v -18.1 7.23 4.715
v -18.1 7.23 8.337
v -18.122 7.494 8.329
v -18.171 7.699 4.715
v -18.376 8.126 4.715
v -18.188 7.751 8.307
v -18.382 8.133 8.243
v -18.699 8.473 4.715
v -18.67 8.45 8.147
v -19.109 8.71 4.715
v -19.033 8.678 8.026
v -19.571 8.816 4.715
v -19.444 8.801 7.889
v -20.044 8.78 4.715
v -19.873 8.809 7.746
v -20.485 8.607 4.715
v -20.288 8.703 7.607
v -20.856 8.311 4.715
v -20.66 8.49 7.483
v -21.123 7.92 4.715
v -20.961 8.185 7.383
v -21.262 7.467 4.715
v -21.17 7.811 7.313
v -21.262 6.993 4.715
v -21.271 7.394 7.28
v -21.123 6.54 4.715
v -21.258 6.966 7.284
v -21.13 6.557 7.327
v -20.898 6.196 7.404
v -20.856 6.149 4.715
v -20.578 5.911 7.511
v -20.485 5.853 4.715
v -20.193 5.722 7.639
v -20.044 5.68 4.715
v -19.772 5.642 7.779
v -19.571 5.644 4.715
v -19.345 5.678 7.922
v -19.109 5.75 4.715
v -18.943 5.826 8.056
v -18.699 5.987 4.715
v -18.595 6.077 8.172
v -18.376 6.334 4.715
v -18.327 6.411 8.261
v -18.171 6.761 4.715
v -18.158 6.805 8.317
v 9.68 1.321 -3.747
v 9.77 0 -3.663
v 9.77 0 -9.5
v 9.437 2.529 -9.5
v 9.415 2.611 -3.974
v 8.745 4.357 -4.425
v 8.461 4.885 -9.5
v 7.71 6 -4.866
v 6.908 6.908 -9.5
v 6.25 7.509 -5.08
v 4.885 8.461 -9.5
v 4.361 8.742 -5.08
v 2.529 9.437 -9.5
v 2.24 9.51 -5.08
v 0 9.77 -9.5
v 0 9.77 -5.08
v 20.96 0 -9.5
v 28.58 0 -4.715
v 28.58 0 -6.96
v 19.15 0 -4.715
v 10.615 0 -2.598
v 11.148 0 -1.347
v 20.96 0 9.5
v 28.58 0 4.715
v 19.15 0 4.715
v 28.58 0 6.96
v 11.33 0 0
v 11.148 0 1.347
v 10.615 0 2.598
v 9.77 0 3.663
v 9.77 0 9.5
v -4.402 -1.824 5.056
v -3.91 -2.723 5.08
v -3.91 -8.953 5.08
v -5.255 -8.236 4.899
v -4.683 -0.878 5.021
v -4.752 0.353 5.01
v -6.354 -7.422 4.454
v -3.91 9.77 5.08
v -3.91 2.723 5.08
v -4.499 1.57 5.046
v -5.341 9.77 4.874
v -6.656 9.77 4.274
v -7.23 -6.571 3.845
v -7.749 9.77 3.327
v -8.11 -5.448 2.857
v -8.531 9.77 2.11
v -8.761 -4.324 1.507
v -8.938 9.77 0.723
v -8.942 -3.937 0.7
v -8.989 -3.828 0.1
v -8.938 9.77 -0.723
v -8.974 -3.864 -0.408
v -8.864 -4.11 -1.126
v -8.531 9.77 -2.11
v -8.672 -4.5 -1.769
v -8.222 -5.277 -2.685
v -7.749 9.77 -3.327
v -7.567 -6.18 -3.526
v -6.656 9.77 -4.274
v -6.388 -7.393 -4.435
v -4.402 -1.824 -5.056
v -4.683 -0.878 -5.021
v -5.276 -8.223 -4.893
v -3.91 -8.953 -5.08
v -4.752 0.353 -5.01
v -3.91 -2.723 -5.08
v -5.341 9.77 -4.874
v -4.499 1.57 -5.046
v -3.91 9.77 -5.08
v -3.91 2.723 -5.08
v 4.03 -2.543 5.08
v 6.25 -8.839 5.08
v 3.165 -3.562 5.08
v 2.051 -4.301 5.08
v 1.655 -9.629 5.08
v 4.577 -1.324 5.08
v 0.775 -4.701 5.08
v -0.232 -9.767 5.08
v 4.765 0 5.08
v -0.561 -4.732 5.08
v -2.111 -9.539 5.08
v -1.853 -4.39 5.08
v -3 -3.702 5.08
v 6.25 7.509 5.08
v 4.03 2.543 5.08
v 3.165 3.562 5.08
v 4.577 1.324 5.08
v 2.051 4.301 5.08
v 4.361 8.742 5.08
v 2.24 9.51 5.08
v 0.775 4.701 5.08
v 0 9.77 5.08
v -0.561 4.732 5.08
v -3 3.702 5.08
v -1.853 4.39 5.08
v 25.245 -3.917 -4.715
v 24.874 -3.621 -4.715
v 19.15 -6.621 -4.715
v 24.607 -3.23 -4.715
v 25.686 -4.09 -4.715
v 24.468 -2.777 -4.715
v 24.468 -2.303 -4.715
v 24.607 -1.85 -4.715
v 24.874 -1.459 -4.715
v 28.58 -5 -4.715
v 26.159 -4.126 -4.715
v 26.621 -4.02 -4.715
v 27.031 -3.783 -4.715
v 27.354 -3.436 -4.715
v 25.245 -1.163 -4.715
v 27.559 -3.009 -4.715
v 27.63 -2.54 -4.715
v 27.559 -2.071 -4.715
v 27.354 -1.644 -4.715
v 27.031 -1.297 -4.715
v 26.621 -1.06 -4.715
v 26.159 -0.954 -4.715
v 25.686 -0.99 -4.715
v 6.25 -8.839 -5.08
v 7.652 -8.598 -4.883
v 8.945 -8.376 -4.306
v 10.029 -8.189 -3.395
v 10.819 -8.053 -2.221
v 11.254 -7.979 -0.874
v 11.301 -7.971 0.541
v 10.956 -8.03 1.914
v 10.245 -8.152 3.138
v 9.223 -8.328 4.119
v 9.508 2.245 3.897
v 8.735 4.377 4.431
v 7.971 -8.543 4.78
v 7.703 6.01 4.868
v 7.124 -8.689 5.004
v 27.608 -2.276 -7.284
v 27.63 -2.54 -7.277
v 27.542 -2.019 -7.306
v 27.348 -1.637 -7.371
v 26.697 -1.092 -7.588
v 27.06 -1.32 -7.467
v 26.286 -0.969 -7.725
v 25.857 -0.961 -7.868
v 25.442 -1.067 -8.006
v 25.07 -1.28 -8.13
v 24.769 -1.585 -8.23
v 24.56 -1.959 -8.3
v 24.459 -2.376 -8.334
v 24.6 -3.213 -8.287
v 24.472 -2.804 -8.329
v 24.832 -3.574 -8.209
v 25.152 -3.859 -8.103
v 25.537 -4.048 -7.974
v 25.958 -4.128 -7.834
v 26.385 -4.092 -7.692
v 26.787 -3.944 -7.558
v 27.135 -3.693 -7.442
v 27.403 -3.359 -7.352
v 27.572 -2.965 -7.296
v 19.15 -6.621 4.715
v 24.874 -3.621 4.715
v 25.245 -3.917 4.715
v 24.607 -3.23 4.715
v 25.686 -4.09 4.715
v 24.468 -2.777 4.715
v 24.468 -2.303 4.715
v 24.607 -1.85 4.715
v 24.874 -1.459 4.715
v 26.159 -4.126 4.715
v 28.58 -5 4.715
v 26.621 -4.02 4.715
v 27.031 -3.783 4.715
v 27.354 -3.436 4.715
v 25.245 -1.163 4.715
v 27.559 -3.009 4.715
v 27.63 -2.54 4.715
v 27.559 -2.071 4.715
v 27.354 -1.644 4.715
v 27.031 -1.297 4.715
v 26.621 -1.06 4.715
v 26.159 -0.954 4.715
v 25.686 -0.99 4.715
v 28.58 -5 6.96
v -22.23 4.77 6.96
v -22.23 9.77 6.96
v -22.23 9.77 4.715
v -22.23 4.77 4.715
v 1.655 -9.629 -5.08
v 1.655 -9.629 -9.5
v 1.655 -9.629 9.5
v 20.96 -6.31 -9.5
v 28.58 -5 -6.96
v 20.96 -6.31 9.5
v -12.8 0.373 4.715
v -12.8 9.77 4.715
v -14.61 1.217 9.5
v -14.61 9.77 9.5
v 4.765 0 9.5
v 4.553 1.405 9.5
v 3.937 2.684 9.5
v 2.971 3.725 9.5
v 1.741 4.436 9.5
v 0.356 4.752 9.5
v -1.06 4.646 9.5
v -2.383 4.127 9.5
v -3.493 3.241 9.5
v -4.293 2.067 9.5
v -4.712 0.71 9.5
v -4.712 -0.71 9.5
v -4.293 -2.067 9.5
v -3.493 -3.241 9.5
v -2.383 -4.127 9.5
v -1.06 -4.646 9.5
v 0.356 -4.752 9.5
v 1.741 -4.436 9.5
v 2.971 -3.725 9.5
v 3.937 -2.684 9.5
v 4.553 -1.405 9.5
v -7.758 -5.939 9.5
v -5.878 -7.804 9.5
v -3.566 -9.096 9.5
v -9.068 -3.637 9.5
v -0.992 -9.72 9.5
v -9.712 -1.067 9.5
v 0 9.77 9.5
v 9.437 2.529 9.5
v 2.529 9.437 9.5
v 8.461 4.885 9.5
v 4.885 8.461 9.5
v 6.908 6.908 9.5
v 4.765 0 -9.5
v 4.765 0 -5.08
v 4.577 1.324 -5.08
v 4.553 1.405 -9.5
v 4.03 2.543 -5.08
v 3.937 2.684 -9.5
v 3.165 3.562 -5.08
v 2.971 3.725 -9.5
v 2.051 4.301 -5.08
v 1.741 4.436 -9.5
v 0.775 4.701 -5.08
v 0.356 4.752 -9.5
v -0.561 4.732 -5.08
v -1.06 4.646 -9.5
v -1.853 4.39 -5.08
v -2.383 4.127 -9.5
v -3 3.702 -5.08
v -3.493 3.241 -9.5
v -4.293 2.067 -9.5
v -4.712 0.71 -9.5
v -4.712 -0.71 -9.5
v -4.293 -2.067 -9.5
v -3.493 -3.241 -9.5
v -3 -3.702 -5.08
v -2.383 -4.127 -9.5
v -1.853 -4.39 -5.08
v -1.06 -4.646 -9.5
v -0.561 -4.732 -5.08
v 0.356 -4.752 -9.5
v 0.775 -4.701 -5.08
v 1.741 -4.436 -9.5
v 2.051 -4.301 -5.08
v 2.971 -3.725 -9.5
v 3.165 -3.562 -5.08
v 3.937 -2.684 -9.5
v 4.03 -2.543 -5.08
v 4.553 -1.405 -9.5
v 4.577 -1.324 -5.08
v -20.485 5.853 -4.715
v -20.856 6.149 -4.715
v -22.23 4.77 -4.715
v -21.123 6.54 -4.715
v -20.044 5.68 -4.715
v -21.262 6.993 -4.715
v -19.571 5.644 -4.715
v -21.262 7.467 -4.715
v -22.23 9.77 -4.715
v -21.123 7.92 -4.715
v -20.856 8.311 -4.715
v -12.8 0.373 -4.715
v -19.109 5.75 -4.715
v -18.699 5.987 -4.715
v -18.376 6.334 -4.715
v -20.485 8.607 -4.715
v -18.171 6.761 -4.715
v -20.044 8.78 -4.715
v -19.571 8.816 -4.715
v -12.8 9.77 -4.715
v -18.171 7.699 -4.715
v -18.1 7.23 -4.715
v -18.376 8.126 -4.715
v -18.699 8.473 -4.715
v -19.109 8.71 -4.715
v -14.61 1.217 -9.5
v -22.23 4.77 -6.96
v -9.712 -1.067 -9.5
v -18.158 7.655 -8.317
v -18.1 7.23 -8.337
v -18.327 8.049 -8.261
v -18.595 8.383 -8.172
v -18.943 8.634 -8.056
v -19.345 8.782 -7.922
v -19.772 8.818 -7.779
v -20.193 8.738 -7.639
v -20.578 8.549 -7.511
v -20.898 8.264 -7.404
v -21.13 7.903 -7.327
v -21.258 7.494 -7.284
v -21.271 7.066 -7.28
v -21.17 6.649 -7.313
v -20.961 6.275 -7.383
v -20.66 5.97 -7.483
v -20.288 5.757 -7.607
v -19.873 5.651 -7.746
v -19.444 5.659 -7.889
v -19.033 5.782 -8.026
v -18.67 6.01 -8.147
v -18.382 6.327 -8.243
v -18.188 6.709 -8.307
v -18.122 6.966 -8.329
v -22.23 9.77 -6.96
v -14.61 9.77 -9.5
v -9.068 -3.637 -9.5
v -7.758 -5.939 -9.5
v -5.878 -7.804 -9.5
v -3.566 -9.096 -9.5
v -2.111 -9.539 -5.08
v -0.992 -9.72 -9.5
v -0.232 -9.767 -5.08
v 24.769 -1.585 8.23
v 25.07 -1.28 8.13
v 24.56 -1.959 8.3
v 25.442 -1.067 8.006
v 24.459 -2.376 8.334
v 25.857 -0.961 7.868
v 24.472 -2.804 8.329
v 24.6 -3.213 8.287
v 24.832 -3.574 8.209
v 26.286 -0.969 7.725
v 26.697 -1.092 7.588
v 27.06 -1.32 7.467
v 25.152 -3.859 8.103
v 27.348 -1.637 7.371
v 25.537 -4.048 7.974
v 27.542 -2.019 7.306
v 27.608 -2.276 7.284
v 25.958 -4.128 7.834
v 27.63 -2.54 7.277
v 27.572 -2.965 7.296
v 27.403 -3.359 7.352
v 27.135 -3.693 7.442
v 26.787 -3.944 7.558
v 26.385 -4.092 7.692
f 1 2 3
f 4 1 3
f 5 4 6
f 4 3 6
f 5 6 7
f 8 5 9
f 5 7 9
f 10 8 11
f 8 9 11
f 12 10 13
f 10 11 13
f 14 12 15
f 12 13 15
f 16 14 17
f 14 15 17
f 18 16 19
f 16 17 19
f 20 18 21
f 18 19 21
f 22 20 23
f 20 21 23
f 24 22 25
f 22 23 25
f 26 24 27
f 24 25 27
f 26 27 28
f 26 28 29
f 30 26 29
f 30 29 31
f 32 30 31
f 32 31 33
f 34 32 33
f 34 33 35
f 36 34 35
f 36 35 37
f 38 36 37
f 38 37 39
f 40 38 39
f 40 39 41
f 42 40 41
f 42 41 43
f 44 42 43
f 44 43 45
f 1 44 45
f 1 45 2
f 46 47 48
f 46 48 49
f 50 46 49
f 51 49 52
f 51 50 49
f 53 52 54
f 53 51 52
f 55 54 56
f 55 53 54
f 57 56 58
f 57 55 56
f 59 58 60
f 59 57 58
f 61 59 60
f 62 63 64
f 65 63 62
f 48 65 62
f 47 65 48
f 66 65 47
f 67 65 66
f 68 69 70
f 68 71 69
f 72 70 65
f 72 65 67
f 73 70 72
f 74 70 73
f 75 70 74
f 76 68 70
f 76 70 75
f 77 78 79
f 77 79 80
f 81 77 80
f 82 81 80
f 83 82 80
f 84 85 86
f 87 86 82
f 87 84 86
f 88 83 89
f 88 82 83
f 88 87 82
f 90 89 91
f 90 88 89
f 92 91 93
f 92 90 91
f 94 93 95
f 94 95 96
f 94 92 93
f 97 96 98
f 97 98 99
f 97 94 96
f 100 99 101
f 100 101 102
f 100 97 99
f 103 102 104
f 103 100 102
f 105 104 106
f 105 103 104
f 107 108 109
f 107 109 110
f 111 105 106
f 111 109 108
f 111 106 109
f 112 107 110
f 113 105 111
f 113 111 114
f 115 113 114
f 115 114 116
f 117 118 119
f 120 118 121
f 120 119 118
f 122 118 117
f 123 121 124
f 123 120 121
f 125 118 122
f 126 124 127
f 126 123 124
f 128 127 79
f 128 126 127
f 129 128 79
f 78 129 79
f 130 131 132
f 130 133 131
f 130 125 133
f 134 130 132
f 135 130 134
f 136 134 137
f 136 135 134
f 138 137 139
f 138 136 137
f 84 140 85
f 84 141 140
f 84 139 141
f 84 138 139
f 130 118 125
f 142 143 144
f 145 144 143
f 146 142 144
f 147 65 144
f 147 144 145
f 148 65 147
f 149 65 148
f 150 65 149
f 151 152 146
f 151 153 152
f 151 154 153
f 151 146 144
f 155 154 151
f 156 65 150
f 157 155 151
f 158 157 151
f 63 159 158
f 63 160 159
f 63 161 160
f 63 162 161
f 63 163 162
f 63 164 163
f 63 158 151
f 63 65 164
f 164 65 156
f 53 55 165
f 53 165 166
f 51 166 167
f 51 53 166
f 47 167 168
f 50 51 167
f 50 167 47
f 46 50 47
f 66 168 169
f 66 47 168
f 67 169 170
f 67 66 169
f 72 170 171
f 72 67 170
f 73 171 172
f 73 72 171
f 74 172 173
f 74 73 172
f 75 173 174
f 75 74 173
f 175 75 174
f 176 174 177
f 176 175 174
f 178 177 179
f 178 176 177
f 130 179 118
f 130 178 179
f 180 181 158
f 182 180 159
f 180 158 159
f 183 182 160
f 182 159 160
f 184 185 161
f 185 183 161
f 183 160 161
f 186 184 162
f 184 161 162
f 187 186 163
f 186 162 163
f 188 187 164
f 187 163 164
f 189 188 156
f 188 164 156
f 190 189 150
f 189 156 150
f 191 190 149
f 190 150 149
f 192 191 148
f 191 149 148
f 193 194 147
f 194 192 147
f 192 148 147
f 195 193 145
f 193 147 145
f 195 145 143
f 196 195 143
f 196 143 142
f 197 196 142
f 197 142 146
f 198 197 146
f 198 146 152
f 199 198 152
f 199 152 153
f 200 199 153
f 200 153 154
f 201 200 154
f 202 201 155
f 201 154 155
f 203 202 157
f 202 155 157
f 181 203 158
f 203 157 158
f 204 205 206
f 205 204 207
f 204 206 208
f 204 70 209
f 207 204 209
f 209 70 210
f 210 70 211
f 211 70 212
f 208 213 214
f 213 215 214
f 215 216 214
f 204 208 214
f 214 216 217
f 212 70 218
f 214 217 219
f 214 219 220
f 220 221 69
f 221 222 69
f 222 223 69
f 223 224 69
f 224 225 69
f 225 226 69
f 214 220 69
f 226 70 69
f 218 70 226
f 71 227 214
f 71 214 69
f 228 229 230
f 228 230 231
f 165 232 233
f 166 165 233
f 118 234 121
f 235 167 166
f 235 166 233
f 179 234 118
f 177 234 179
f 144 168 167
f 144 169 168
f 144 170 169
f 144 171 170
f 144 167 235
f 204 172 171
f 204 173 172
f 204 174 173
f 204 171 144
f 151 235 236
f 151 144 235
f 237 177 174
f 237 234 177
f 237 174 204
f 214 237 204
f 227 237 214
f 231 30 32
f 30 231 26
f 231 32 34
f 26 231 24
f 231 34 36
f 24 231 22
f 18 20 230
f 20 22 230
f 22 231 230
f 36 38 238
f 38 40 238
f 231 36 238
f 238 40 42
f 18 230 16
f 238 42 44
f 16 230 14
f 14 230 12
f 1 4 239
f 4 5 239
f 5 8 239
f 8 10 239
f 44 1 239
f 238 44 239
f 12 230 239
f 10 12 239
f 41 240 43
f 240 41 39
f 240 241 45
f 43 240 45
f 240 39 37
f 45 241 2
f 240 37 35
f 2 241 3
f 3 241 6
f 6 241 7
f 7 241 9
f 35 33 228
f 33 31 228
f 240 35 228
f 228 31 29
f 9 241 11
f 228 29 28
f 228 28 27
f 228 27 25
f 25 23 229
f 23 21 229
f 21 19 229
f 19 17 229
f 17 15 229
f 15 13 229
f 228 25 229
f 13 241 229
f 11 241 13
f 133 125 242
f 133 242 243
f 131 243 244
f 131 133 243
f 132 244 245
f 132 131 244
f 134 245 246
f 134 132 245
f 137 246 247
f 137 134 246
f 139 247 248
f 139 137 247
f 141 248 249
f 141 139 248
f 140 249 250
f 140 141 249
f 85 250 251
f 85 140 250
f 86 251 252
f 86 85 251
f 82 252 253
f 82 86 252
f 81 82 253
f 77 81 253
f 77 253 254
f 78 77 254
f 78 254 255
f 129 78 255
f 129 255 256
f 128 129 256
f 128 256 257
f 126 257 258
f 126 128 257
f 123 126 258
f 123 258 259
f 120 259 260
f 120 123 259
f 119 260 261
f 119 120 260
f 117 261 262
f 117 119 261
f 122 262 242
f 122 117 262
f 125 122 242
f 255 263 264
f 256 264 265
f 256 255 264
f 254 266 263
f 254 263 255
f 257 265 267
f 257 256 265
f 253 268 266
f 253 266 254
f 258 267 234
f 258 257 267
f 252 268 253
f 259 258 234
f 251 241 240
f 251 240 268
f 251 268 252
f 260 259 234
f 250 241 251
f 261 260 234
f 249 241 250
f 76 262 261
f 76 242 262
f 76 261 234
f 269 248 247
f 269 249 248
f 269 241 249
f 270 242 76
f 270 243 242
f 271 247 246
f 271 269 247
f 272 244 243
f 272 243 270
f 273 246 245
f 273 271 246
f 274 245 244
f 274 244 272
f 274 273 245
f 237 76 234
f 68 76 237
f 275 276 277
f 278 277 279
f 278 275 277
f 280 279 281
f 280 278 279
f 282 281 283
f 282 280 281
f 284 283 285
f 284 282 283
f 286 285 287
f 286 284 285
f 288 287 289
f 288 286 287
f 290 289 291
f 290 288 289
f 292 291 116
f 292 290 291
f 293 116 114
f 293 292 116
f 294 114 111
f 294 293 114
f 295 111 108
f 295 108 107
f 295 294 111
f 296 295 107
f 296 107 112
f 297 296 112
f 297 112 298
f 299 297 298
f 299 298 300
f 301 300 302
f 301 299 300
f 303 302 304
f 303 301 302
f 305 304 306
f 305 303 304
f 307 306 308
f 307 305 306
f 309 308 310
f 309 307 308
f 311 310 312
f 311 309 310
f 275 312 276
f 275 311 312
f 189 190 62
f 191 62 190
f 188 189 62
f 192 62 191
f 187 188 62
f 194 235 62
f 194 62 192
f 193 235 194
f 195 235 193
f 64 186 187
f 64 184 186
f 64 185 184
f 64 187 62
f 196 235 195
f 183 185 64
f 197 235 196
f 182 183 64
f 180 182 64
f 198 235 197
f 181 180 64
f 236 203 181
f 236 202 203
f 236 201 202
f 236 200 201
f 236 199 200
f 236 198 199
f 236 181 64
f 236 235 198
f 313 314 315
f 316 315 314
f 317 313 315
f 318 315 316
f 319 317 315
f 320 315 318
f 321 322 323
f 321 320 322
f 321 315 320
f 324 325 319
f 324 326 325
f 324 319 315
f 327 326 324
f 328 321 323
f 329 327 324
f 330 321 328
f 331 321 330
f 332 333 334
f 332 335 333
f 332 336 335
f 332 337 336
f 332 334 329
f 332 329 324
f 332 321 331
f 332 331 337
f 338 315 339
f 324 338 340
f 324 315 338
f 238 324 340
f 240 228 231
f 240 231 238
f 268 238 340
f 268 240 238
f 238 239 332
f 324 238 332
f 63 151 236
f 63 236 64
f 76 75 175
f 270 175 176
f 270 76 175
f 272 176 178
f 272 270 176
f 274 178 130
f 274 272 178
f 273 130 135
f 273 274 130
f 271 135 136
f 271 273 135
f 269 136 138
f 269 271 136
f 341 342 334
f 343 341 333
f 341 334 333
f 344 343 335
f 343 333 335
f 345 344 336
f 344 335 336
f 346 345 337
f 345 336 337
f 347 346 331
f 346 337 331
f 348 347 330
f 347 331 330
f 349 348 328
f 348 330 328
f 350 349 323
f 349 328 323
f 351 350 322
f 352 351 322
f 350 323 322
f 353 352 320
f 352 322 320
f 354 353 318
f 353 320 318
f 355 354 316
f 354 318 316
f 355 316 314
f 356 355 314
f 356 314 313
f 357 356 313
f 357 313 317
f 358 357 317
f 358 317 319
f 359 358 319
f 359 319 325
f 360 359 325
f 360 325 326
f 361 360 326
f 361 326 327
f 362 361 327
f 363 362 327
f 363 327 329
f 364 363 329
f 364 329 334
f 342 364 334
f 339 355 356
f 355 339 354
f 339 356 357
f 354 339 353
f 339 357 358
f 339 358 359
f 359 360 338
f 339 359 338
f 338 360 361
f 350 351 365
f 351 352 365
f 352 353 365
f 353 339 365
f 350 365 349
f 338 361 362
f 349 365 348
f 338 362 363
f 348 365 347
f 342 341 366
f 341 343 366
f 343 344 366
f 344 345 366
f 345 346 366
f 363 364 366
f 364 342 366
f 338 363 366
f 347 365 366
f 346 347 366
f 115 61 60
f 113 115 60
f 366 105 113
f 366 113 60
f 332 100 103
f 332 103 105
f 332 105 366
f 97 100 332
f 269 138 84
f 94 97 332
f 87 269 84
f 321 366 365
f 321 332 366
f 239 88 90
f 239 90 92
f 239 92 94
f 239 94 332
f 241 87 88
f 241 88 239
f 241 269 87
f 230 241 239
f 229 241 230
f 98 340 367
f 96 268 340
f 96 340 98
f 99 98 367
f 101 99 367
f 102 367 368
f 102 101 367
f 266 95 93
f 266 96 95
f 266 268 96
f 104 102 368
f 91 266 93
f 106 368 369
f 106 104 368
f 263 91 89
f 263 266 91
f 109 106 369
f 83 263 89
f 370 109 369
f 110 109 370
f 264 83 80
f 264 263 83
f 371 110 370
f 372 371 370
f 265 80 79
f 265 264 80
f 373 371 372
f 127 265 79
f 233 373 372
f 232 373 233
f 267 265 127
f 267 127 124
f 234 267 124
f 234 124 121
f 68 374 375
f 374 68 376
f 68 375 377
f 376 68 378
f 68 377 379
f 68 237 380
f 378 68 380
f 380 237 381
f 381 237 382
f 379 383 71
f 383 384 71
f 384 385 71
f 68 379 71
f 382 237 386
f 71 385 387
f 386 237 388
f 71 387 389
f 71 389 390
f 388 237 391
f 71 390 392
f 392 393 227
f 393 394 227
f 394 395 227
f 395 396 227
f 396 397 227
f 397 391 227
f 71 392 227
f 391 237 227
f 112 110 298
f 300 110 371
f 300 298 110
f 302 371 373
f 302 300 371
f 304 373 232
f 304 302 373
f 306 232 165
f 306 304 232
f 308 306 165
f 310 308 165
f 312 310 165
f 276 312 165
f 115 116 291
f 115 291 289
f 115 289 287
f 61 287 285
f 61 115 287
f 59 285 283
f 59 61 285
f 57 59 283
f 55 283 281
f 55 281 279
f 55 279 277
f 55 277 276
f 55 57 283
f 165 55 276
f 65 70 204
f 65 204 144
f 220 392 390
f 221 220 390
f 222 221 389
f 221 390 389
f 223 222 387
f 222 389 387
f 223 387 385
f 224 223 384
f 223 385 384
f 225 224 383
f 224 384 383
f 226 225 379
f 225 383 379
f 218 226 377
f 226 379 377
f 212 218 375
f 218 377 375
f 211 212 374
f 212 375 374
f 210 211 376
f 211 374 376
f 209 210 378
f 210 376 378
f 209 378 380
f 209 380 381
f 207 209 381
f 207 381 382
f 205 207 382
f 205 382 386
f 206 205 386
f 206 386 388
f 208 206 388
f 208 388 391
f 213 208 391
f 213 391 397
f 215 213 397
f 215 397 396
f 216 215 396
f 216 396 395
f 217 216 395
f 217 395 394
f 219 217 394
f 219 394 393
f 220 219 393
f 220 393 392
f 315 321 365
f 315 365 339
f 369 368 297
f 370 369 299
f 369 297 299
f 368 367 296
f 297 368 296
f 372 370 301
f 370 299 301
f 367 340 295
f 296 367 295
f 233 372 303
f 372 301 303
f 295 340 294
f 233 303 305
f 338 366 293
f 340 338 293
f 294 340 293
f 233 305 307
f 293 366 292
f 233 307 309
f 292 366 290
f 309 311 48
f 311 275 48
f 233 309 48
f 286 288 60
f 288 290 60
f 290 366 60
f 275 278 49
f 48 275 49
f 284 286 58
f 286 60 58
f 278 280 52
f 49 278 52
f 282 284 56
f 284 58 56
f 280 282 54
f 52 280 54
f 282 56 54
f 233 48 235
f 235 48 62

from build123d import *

# Parameters (mm, degrees)
SKETCH1_R           = 4.765
BOSS_EXTRUDE1_DEPTH = 9.5
SKETCH3_W           = 9.43
SKETCH3_H           = 9.43
CUT_EXTRUDE1_DEPTH  = 36.900947063
CUT_EXTRUDE2_DEPTH  = 36.900947063
SKETCH5_R           = 1.59
CUT_EXTRUDE3_DEPTH  = 36.682899346
CHAMFER1_SIZE       = 2.54
CHAMFER1_SIZE_2     = 7.62
CHAMFER2_SIZE       = 7.62
CHAMFER2_SIZE_2     = 2.54


with BuildPart() as part:
    # Sketch1 → Boss-Extrude1 (new, symmetric)
    with BuildSketch(Plane.XY):
        with BuildLine():
            Line((0, 9.77), (-22.23, 9.77))
            Line((-22.23, 9.77), (-22.23, 4.77))
            Line((-22.23, 4.77), (-9.711509246, -1.067468107))
            ThreePointArc((-9.711509246, -1.067468107), (-5.877874817, -7.804068659), (1.655323868, -9.628748771))
            Line((1.655323868, -9.628748771), (28.58, -5))
            Line((28.58, -5), (28.58, 0))
            Line((28.58, 0), (9.77, 0))
            ThreePointArc((9.77, 0), (6.908433252, 6.908433252), (0, 9.77))
        make_face()
        Circle(SKETCH1_R, mode=Mode.SUBTRACT)
    extrude(amount=BOSS_EXTRUDE1_DEPTH, both=True)

    # Sketch3 → Cut-Extrude1 (cut, through all)
    with BuildSketch(Plane(origin=(0, 9.77, 0), x_dir=(1, 0, 0), z_dir=(0, 1, 0))):
        with Locations((-17.515, 0)):
            Rectangle(SKETCH3_W, SKETCH3_H)
        with Locations((23.865, 0)):
            Rectangle(SKETCH3_W, SKETCH3_H)
    extrude(amount=-CUT_EXTRUDE1_DEPTH, mode=Mode.SUBTRACT)

    # Sketch4 → Cut-Extrude2 (cut, through all)
    with BuildSketch(Plane(origin=(0, 9.77, 0), x_dir=(1, 0, 0), z_dir=(0, 1, 0))):
        with BuildLine():
            Line((-3.91, 5.08), (6.25, 5.08))
            ThreePointArc((6.25, 5.08), (11.33, 0), (6.25, -5.08))
            Line((6.25, -5.08), (-3.91, -5.08))
            ThreePointArc((-3.91, -5.08), (-8.99, 0), (-3.91, 5.08))
        make_face()
    extrude(amount=-CUT_EXTRUDE2_DEPTH, mode=Mode.SUBTRACT)

    # Sketch5 → Cut-Extrude3 (cut, through all)
    with BuildSketch(Plane.XY.offset(9.5)):
        with Locations((-19.69, 7.23)):
            Circle(SKETCH5_R)
        with Locations((26.04, -2.54)):
            Circle(SKETCH5_R)
    extrude(amount=-CUT_EXTRUDE3_DEPTH, mode=Mode.SUBTRACT)

    # Chamfer1
    # the kernel refuses this chamfer: 7.62, 2.54 mm, written as the material it takes off along each edge
    with BuildSketch(Plane(origin=(-22.23, 29.544364901, -9.5), x_dir=(-0.1090261201798072, 0, 0.9940388851139267), z_dir=(0, -1, 0))) as chamfer1_piece_1:
        Polygon((CHAMFER1_SIZE * 0.994038885114, -CHAMFER1_SIZE * 0.10902612018), (-CHAMFER1_SIZE_2 * 0.10902612018, -CHAMFER1_SIZE_2 * 0.994038885114), (0, 0), align=None)
    extrude(amount=44.548729802, mode=Mode.SUBTRACT)
    with BuildSketch(Plane(origin=(28.58, -24.774364901, -9.5), x_dir=(-0.9999257509361695, 0, -0.012185754582199181), z_dir=(0, 1, 0))) as chamfer1_piece_2:
        Polygon((CHAMFER1_SIZE_2 * 0.999925750936, CHAMFER1_SIZE_2 * 0.0121857545822), (-CHAMFER1_SIZE * 0.0121857545822, CHAMFER1_SIZE * 0.999925750936), (0, 0), align=None)
    extrude(amount=44.548729802, mode=Mode.SUBTRACT)

    # Chamfer2
    # the kernel refuses this chamfer: 7.62, 2.54 mm, written as the material it takes off along each edge
    with BuildSketch(Plane(origin=(-22.23, 29.544364901, 9.5), x_dir=(0.9999257509361695, 0, 0.012185754582199181), z_dir=(0, -1, 0)), Plane(origin=(28.58, -24.774364901, 9.5), x_dir=(-0.9999257509361695, 0, 0.012185754582199181), z_dir=(0, 1, 0))) as chamfer2_piece_1:
        Polygon((CHAMFER2_SIZE * 0.999925750936, -CHAMFER2_SIZE * 0.0121857545822), (-CHAMFER2_SIZE_2 * 0.0121857545822, -CHAMFER2_SIZE_2 * 0.999925750936), (0, 0), align=None)
    extrude(amount=44.548729802, mode=Mode.SUBTRACT)


solid = part.part
